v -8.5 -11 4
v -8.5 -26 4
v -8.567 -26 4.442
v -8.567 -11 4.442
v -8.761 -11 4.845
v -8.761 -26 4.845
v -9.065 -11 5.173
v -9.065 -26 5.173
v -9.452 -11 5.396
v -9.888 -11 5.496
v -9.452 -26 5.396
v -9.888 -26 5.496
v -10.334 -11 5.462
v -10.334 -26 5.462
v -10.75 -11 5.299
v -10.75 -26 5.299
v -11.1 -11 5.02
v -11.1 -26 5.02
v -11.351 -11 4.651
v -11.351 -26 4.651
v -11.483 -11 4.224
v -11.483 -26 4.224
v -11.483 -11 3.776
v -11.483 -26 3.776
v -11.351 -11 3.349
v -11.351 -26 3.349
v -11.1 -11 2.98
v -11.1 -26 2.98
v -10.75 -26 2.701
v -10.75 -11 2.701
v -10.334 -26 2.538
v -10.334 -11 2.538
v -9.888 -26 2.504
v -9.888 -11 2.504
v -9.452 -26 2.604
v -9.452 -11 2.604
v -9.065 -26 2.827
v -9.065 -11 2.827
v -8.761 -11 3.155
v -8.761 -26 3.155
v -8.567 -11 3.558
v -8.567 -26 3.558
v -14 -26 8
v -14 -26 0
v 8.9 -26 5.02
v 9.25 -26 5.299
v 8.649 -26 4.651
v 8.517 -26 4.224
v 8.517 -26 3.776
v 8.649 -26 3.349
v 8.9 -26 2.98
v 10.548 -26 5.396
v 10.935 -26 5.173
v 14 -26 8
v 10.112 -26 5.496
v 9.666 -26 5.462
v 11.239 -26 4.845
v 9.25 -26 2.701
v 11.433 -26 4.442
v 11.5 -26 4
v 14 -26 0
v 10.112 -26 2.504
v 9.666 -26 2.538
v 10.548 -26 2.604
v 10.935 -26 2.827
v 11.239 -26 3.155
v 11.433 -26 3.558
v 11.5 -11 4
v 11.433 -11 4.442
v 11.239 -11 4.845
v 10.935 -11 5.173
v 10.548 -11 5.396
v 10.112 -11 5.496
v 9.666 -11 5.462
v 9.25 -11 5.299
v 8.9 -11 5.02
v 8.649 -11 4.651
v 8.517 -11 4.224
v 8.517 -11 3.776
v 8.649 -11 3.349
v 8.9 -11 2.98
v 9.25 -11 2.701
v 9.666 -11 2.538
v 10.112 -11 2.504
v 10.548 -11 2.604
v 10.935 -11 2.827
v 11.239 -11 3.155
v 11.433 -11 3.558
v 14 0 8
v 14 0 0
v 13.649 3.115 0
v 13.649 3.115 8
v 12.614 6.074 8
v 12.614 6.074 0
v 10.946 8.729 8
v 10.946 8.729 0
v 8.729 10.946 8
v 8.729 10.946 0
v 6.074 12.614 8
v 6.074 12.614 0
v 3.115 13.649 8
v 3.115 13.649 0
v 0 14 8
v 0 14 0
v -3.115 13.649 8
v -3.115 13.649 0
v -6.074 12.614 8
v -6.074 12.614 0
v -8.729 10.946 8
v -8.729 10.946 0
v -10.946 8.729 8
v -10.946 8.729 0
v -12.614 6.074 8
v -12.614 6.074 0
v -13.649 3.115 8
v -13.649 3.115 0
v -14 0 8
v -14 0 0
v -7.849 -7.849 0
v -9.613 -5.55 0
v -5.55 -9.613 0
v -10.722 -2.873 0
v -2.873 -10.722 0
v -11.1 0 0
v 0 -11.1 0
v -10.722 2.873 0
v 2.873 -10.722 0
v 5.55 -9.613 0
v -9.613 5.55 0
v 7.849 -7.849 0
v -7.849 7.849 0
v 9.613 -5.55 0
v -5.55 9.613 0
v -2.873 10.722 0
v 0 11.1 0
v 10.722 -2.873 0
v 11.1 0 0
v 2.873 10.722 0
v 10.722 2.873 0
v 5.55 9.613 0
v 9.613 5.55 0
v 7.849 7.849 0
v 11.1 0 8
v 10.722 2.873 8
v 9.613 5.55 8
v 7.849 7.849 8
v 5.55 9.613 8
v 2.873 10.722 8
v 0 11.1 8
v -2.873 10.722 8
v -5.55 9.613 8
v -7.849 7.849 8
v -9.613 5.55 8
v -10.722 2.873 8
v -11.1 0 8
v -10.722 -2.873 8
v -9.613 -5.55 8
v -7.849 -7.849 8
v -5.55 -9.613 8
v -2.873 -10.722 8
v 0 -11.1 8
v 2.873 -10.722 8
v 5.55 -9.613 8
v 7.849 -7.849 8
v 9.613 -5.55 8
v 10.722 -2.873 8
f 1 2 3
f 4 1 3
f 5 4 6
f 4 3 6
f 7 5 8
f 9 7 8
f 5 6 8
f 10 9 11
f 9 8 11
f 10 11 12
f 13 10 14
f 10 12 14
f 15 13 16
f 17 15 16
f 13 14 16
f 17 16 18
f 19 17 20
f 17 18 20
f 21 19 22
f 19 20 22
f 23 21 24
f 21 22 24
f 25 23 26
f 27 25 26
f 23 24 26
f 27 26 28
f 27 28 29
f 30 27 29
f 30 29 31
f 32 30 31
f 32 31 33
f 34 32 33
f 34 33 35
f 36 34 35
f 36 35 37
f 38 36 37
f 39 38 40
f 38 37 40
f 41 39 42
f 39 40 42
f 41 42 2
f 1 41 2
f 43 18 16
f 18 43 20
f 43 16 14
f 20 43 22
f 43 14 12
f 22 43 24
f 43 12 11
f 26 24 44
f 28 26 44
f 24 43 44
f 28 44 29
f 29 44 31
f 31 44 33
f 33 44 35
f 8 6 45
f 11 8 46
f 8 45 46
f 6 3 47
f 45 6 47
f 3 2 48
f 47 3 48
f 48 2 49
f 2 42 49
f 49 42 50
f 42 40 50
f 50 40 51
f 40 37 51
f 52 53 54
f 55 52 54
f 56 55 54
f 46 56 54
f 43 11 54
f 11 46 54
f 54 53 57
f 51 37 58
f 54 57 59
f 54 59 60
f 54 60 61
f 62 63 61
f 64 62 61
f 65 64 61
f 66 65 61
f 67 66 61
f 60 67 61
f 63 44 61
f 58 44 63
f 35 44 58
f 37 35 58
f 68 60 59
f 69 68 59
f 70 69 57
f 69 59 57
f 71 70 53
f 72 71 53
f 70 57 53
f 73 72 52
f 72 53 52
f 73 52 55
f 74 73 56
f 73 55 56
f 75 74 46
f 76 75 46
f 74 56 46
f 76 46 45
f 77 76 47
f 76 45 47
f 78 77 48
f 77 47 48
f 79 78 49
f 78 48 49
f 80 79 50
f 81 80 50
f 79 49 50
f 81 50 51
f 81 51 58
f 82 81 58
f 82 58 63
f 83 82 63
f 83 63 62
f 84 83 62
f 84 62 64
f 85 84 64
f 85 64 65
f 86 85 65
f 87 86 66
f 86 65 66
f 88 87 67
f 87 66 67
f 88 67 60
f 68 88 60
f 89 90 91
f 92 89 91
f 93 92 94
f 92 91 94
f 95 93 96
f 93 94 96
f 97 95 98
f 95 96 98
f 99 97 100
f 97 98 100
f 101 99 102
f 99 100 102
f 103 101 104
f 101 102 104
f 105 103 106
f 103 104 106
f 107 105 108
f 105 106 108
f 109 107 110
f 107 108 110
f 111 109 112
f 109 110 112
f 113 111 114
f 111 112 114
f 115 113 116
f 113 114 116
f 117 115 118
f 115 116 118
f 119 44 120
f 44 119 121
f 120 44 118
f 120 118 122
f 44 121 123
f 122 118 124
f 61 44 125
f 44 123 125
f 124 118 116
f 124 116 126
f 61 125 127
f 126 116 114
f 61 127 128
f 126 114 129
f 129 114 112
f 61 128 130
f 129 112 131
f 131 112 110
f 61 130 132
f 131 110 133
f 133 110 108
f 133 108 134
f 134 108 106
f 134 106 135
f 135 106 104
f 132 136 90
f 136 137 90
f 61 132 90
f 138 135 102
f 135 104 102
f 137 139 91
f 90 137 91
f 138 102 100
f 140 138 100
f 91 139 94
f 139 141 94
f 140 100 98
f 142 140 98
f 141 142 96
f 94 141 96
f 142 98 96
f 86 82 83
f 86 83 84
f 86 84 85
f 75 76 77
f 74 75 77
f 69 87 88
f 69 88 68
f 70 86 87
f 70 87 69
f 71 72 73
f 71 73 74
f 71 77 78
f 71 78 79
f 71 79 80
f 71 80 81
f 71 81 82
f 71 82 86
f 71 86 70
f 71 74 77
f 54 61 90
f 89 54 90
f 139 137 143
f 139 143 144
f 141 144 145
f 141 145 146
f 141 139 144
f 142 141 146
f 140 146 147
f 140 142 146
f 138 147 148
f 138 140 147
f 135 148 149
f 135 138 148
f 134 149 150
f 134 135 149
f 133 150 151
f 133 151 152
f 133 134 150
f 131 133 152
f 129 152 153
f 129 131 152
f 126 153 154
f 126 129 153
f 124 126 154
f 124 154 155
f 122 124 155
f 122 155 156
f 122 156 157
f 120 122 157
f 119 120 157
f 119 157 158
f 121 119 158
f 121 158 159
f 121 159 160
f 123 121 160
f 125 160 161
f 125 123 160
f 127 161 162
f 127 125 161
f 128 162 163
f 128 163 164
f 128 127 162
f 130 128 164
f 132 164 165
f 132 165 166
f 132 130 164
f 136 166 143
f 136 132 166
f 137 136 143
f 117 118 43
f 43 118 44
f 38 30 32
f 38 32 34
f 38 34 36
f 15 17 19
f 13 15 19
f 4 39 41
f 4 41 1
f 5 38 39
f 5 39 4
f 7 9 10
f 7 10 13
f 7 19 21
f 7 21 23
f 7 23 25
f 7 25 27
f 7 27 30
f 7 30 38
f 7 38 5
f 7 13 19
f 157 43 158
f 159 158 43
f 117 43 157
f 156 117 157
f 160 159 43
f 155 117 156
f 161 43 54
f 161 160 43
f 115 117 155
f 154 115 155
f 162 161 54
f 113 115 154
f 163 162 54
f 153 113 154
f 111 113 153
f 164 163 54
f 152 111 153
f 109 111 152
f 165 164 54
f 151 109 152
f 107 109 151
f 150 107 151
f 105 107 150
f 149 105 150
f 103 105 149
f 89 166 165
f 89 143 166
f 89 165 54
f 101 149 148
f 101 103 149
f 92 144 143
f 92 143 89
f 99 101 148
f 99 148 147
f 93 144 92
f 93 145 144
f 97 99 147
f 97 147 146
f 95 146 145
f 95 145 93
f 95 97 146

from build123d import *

# Parameters (mm, degrees)
ESQUISSE1_R             = 11.1
BOSS_EXTRU_1_DEPTH      = 8
ESQUISSE2_R             = 1.5
ENL_V_MAT_EXTRU_1_DEPTH = 15


with BuildPart() as part:
    # Esquisse1 → Boss.-Extru.1 (new body)
    with BuildSketch(Plane.XY):
        with BuildLine():
            Line((-14, 0), (-14, -26))
            Line((-14, -26), (14, -26))
            Line((14, -26), (14, 0))
            ThreePointArc((14, 0), (0, 14), (-14, 0))
        make_face()
        Circle(ESQUISSE1_R, mode=Mode.SUBTRACT)
    extrude(amount=BOSS_EXTRU_1_DEPTH)

    # Esquisse2 → Enlèv. mat.-Extru.1 (cut)
    with BuildSketch(Plane.XZ.offset(26)):
        with Locations((-10, 4)):
            Circle(ESQUISSE2_R)
        with Locations((10, 4)):
            Circle(ESQUISSE2_R)
    extrude(amount=-ENL_V_MAT_EXTRU_1_DEPTH, mode=Mode.SUBTRACT)


solid = part.part
